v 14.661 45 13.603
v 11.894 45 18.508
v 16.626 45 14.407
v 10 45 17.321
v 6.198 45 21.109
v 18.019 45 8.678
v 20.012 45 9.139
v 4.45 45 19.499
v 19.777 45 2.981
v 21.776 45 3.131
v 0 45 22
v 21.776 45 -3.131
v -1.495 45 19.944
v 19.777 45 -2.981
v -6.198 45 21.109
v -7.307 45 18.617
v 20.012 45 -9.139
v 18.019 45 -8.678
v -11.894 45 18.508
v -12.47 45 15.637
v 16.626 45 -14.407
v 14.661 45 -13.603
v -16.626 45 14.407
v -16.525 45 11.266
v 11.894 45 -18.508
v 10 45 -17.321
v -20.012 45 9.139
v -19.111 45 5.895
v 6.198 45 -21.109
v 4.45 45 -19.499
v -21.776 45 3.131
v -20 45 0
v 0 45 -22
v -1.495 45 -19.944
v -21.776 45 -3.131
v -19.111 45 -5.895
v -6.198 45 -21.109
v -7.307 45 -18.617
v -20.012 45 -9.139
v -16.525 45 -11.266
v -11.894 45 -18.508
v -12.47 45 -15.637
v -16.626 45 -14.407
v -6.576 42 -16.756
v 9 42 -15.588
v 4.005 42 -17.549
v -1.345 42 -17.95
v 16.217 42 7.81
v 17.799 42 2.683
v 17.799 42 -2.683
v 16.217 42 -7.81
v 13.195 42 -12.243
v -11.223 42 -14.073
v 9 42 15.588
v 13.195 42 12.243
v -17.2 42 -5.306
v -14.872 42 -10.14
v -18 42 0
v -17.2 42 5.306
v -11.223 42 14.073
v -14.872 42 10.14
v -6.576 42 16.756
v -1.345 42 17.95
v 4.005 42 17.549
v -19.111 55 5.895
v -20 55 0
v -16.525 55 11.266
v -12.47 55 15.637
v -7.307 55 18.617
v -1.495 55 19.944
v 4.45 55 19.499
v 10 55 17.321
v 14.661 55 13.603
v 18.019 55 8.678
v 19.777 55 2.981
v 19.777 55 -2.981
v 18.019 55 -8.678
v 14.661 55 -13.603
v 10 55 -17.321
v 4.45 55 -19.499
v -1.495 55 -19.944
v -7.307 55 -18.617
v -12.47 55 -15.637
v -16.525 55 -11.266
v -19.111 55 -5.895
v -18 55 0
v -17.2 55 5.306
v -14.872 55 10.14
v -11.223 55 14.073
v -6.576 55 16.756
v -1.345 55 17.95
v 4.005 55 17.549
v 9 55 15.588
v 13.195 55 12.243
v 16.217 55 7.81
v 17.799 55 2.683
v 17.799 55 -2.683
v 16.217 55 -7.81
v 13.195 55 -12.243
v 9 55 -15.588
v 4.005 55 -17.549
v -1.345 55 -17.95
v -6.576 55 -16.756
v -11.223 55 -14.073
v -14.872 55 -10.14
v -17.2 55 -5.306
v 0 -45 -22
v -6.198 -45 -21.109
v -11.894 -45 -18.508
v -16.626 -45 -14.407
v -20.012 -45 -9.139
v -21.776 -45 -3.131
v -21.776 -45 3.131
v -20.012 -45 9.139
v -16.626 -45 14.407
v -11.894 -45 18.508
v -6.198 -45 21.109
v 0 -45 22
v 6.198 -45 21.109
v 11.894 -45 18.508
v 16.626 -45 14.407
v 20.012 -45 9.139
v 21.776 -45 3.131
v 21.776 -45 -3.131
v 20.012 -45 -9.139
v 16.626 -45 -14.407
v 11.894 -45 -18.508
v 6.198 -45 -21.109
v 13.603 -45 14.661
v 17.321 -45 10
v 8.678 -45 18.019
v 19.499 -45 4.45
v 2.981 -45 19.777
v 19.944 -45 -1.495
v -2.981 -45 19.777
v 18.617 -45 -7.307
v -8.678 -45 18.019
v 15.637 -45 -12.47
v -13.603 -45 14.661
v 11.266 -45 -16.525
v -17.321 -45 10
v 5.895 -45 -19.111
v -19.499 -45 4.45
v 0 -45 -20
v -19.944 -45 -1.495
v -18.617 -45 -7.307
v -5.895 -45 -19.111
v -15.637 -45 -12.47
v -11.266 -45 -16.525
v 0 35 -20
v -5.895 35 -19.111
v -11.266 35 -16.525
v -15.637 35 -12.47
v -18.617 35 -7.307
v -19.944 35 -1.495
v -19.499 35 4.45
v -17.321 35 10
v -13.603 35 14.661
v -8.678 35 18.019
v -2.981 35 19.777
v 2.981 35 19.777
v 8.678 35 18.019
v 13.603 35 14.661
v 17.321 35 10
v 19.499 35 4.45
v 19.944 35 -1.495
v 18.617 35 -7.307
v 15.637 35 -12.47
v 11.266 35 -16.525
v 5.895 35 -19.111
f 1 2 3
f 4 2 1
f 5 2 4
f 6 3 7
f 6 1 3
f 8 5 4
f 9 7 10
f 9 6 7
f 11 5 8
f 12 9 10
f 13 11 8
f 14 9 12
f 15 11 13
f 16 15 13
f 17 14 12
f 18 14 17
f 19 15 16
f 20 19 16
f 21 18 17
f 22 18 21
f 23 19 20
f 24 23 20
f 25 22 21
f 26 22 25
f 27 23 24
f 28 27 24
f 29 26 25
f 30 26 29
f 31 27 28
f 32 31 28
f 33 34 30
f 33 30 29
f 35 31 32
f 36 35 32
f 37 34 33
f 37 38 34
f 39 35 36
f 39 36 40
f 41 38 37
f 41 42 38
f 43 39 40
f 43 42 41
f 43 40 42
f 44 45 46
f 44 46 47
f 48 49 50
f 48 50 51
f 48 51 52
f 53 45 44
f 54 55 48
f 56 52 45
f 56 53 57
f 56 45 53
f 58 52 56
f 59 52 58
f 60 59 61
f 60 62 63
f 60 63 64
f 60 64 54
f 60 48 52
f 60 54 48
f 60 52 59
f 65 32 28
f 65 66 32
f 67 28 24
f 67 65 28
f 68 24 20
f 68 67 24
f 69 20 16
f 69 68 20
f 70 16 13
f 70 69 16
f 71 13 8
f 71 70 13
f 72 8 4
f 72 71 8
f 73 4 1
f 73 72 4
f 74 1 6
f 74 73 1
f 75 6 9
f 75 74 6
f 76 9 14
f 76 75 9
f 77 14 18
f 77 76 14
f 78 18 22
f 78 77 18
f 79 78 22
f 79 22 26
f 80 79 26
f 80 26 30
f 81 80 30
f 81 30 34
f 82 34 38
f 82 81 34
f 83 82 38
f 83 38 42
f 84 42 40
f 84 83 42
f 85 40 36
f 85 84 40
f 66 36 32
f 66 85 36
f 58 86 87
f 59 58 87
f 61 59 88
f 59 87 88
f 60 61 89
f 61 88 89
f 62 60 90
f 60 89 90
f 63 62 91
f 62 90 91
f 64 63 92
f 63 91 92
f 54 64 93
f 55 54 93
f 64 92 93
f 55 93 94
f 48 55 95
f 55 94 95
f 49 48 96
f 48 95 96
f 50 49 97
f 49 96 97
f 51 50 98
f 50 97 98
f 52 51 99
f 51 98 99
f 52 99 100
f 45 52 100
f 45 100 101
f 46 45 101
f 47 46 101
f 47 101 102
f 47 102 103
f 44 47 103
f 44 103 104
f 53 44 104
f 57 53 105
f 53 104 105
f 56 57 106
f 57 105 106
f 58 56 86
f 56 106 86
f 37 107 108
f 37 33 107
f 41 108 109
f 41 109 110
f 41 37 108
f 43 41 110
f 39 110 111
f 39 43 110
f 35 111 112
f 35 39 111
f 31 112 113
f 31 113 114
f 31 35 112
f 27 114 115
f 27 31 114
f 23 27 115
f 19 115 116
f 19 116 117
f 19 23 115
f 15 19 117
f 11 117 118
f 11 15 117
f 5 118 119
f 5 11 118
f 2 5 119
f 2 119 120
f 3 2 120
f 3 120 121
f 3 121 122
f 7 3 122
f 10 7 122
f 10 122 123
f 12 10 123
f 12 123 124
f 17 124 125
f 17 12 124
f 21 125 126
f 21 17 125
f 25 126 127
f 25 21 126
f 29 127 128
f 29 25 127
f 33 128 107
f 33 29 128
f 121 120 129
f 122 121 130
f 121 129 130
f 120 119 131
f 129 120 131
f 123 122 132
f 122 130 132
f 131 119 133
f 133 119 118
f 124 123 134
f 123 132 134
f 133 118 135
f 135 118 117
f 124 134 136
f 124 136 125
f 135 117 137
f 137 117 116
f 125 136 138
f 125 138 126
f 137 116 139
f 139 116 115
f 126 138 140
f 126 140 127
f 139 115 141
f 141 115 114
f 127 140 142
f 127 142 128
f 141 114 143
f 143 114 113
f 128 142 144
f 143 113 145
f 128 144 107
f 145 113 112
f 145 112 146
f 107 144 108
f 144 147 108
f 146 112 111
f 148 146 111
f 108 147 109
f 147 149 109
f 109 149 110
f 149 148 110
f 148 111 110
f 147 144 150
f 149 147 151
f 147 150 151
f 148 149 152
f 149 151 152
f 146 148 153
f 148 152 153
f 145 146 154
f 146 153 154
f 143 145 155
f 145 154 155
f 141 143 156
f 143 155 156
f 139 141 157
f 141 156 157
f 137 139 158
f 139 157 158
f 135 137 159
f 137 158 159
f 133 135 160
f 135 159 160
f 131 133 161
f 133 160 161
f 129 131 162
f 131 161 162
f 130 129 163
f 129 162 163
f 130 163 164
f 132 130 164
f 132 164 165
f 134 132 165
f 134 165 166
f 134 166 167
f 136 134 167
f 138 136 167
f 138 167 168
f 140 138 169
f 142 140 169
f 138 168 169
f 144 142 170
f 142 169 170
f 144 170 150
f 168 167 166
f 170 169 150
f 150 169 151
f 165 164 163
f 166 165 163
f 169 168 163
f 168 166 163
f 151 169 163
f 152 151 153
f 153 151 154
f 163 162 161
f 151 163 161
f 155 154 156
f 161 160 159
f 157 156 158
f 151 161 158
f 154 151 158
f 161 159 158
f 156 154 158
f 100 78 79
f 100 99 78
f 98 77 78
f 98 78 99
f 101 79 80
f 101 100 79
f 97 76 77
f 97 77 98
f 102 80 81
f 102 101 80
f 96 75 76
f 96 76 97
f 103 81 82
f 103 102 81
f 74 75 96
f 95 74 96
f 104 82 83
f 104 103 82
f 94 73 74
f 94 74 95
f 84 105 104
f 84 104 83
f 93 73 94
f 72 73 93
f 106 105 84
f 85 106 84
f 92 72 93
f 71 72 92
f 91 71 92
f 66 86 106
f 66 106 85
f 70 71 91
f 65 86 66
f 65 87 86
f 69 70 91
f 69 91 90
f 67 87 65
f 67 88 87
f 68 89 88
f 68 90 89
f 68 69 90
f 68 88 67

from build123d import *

# Parameters (mm, degrees)
F0_W     = 90
F0_H     = 2
F2_R     = 20
F3_DEPTH = 10
F4_R     = 18
F5_DEPTH = 13


with BuildPart() as f1:
    # F0 (on Right) → F1 (revolve)
    with BuildSketch(Plane.YZ):
        with Locations((0, -21)):
            Rectangle(F0_W, F0_H)
    revolve(axis=Axis((0, 40.8125, 0), (0, 1, 0)))

    # F2 (on face) → F3 (join, symmetric)
    with BuildSketch(Plane(origin=(0, 45, 0), x_dir=(-1, 0, 0), z_dir=(0, 1, 0))):
        Circle(F2_R)
    extrude(amount=F3_DEPTH, both=True)

    # F4 (on face) → F5 (cut)
    with BuildSketch(Plane(origin=(0, 55, 0), x_dir=(-1, 0, 0), z_dir=(0, 1, 0))):
        Circle(F4_R)
    extrude(amount=-F5_DEPTH, mode=Mode.SUBTRACT)


solid = f1.part
